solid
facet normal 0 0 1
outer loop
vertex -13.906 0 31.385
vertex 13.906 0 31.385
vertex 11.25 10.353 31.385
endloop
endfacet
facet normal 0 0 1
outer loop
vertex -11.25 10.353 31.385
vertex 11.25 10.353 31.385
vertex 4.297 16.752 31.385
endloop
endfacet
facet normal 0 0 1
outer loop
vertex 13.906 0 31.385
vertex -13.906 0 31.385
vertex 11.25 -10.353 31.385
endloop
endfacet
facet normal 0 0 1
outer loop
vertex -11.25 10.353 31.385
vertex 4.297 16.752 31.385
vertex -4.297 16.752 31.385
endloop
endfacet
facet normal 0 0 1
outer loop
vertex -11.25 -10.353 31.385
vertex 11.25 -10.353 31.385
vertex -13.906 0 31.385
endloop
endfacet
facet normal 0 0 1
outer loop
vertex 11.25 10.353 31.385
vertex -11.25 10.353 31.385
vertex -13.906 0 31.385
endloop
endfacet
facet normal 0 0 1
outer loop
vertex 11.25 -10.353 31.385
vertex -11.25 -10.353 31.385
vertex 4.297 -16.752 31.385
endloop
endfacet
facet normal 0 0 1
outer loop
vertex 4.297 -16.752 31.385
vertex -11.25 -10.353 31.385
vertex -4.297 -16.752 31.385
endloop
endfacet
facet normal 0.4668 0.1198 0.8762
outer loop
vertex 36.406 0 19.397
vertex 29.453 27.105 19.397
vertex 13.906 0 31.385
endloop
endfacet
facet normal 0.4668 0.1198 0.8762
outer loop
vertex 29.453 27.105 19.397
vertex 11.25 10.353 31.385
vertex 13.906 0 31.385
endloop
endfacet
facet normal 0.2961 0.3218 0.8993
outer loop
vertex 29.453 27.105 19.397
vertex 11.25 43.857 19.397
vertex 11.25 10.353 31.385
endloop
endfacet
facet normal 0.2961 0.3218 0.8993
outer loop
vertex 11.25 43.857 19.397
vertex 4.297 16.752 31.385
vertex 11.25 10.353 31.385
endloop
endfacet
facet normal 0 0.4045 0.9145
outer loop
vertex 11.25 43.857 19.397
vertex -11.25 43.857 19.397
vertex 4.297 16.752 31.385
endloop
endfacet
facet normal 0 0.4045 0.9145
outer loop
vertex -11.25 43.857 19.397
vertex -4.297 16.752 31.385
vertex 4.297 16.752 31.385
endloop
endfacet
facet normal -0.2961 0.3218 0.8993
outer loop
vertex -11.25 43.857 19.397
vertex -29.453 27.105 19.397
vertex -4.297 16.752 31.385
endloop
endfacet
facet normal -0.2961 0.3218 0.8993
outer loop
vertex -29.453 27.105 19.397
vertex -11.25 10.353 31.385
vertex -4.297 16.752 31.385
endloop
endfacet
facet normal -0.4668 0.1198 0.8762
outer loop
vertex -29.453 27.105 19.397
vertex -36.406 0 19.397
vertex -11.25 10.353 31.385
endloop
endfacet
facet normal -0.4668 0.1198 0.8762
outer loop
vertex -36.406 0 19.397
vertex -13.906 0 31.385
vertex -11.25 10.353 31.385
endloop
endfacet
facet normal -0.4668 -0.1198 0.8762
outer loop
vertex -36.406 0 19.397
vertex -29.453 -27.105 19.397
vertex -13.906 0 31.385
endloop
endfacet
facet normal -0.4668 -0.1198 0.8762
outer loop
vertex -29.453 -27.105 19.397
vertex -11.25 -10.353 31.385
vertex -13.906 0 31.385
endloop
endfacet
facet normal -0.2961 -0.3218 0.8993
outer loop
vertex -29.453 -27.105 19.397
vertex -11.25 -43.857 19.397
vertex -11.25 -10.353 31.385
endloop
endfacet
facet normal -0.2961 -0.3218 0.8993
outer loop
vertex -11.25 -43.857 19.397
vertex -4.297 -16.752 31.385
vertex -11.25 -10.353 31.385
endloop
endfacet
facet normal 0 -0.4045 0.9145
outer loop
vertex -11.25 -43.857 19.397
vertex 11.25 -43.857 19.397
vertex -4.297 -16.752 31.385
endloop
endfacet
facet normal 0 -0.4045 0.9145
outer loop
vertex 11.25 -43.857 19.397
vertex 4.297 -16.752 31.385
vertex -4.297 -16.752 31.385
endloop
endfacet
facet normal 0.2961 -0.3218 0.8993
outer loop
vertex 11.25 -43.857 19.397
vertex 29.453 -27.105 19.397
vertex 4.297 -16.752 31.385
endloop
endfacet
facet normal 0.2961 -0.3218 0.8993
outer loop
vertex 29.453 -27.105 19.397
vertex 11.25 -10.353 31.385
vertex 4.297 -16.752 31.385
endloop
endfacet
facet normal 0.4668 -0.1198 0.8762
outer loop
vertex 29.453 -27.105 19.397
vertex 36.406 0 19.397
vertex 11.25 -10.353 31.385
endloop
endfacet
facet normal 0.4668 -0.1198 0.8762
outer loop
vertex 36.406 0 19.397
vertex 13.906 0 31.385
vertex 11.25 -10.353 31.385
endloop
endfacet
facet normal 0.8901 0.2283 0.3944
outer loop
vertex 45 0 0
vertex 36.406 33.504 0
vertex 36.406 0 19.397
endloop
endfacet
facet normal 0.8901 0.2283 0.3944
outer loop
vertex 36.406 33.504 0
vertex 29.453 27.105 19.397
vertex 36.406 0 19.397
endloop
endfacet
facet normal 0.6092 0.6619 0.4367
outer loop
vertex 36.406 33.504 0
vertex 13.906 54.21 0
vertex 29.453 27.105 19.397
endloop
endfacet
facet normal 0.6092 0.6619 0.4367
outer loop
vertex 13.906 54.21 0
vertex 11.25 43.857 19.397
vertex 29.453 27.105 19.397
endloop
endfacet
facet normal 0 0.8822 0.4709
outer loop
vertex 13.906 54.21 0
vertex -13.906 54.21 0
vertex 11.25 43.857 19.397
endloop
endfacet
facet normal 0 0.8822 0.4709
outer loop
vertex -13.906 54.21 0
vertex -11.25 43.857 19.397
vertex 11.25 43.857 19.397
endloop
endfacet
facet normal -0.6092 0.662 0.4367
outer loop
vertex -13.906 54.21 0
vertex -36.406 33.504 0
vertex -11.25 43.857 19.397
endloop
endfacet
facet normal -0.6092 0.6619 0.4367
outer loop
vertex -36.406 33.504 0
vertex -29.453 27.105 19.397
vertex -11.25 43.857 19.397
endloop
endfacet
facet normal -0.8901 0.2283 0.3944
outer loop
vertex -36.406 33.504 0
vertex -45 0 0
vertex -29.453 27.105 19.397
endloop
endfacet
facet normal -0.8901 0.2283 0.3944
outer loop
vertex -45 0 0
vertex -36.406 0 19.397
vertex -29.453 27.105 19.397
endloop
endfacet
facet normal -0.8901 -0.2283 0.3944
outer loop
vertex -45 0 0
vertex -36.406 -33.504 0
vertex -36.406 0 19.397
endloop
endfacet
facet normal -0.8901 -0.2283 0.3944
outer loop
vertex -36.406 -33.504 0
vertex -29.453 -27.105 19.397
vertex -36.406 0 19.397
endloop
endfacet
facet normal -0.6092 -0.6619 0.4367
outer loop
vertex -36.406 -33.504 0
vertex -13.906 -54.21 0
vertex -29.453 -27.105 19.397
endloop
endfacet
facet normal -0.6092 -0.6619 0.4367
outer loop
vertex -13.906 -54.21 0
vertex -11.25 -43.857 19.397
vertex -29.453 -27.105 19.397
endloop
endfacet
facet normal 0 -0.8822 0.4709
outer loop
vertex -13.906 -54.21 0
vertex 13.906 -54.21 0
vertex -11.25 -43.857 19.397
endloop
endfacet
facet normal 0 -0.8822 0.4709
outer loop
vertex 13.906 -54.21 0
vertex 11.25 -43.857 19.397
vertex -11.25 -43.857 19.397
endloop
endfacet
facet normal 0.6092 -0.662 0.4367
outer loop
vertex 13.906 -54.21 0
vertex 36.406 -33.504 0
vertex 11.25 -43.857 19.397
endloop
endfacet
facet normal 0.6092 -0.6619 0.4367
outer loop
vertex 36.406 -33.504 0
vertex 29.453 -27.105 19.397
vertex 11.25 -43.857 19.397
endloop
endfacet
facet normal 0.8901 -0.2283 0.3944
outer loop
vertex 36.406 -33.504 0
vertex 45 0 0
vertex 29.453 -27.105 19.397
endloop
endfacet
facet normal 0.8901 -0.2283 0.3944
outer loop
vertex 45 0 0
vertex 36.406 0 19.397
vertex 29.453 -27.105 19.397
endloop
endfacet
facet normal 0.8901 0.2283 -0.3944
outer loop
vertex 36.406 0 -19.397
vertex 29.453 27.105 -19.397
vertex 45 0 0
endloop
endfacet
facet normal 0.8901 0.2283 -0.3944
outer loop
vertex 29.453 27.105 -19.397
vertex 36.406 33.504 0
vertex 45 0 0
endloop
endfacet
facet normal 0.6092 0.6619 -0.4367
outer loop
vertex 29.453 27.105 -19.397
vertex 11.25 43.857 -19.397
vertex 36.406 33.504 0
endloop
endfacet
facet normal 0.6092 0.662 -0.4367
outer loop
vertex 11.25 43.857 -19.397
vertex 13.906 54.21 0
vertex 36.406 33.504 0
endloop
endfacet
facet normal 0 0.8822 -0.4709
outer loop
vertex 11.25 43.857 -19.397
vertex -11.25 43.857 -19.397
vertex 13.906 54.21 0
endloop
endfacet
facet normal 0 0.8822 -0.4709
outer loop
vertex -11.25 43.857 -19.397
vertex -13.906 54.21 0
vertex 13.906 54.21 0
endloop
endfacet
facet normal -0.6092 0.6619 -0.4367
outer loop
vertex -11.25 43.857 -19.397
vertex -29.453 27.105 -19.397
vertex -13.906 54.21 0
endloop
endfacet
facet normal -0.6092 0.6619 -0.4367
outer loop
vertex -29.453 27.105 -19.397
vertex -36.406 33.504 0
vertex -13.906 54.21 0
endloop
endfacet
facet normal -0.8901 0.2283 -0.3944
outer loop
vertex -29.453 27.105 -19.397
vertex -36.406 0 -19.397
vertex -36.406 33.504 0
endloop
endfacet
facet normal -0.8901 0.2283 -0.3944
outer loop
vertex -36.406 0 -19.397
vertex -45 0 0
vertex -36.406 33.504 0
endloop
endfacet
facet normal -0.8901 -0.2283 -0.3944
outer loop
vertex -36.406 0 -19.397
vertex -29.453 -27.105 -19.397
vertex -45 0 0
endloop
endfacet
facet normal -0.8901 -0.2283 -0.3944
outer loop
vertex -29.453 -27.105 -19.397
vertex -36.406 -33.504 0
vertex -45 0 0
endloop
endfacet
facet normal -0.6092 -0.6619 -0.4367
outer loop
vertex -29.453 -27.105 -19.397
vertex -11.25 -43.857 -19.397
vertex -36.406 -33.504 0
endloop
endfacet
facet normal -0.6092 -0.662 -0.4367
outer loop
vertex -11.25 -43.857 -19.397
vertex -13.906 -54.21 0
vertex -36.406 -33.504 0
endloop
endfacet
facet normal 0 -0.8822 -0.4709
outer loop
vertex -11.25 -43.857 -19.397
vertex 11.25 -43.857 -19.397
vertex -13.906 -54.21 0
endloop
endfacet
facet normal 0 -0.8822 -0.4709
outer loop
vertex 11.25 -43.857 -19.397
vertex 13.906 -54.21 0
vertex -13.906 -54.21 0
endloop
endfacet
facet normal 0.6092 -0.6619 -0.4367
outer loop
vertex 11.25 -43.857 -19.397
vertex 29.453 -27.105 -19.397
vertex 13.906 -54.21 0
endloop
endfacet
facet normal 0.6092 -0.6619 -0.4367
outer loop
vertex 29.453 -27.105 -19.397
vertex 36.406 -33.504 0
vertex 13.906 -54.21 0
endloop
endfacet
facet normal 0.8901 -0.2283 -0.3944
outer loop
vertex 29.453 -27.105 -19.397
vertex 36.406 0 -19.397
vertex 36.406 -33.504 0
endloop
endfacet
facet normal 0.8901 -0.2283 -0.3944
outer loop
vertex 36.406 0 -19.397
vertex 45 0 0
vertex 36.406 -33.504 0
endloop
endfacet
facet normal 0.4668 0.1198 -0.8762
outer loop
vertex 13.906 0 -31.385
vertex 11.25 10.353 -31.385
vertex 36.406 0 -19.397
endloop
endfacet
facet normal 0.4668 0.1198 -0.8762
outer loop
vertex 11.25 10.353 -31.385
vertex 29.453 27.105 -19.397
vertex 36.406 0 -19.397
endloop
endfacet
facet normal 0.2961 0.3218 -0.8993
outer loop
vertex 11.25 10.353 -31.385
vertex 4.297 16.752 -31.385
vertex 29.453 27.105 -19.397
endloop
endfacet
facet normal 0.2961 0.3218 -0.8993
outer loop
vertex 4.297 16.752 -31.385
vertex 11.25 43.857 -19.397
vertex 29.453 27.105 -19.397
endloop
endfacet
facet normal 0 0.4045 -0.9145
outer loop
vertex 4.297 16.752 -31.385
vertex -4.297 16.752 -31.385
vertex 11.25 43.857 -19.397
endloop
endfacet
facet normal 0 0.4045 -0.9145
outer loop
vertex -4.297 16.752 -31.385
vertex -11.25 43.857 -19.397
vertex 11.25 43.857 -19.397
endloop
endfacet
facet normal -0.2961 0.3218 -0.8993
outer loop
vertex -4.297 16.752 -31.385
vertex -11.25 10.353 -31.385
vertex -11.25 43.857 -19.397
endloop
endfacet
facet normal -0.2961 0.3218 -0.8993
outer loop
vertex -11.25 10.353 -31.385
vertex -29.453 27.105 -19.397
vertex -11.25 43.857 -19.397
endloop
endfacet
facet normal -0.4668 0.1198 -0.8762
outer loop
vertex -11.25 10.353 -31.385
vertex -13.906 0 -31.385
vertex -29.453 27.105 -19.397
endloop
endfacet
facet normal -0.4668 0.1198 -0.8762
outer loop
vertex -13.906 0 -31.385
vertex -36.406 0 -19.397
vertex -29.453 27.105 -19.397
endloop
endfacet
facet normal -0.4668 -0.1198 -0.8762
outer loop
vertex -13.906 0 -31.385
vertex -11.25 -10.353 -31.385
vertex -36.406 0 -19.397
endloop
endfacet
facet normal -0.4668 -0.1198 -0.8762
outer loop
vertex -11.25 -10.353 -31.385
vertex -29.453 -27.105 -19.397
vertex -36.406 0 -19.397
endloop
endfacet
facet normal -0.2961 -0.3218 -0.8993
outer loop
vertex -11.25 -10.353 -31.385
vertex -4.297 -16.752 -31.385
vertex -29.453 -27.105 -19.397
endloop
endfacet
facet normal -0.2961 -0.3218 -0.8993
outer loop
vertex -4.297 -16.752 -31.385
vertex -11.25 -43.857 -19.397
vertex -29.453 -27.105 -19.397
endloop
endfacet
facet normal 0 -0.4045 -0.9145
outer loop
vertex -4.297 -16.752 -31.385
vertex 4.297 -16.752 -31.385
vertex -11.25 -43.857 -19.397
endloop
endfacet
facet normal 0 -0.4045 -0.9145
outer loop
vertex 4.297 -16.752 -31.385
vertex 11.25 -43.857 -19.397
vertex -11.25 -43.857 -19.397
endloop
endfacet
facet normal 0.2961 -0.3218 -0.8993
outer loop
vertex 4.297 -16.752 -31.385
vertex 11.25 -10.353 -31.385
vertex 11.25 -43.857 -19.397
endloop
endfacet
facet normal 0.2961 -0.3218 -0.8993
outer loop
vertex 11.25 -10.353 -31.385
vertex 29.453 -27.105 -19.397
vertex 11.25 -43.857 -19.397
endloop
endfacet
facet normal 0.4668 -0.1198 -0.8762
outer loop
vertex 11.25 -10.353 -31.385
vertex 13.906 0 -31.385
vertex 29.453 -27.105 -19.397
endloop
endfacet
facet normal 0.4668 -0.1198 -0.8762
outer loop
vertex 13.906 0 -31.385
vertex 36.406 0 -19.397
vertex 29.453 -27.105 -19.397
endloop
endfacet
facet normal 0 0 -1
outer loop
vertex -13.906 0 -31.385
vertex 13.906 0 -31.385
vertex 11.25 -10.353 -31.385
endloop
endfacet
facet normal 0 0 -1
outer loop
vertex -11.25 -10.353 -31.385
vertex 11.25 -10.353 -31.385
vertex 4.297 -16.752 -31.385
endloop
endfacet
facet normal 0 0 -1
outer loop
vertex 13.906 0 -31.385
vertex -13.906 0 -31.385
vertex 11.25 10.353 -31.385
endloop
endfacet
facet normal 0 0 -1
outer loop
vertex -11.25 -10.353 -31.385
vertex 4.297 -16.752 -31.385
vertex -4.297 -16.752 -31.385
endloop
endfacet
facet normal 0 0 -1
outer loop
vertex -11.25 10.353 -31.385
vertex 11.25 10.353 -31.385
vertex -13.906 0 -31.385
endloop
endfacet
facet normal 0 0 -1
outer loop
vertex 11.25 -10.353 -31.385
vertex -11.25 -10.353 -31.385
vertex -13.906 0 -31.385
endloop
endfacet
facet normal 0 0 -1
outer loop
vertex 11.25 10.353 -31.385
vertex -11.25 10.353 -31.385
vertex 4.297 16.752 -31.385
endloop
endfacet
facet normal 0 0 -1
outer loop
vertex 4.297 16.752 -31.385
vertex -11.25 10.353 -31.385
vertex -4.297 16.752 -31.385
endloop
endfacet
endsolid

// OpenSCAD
// Generated by SolidPython 1.0.1 on 2020-07-29 00:46:52


scale(v = [15, 19, 11]) {
	sphere(r = 3);
}
/***********************************************
*********      SolidPython code:      **********
************************************************
 
# import packages: SolidPython
from solid import *
from solid.utils import *
from itertools import chain, combinations, permutations


class Resize:

    def __init__(self, scad_file):
        self.scad_file = scad_file
        #self.scad_file = import_scad(scad_file)
        # cone/cylinder param:
        self.r1 = 0
        self.r2 = 0
        self.h = 0
        # rectangular prism param:
        self.w = 0
        self.l = 0
        # ellipse param:
        self.r = 0

    # import OpenScad code (file name corresponds to shape)


    # classify shape + parameters
    def assign(self, param1, param2, param3):
        if self.scad_file == 'cone.scad':
            self.r1 = param1
            self.r2 = param2
            self.h = param3
        elif self.scad_file == 'cylinder.scad':
            self.r1 = param1
            self.r2 = param2
            self.h = param3
        elif self.scad_file == 'rectangularPrism.scad':
            self.h = param1
            self.l = param2
            self.w = param3
        else:
            self.r = param1
            self.h = param2

    # resize parameters
    def iterate(self):
        x = range(3, 20, 2)
        i = 1
        if self.scad_file == 'cone.scad':
            tempList = list(permutations(x, 2))
            for temp in tempList:
                param1 = temp[0]
                param2 = temp[1]
                filepath = 'produced_scad_files/' + 'cone' + str(param1) + '_' + str(param2) + '_' + '.scad'
                scad_render_to_file(cylinder(h=param1, r1=param2, r2=0), filepath)

        elif self.scad_file == 'cylinder.scad':
            tempList = list(permutations(x, 3))
            for temp in tempList:
                param1 = temp[0]
                param2 = temp[1]
                filepath = 'produced_scad_files/' + 'cylinder' + str(param1) + '_' + str(param2) + '_' + '.scad'
                scad_render_to_file(cylinder(h=param1, r1=param2, r2=param2), filepath)

        elif self.scad_file == 'rectangularPrism.scad':
            tempList = list(permutations(x, 3))
            for temp in tempList:
                param1 = temp[0]
                param2 = temp[1]
                param3 = temp[2]
                filepath = 'produced_scad_files/' + 'rectangularPrism' + str(param1) + '_' + str(param2) + '_' + str(
                    param3) + '.scad'
                scad_render_to_file(cube(size=(param1, param2, param3)), filepath)

        elif self.scad_file == 'ellipse.scad':
            tempList = list(permutations(x, 4))
            for temp in tempList:
                param1 = temp[0]
                param2 = temp[1]
                param3 = temp[2]
                param4 = temp[3]
                filepath = 'produced_scad_files/' + 'ellipse' + str(param1) + '_' + str(param2) + '_' + str(param3) + '_' + str(param4) + '.scad'
                scad_render_to_file(scale([param1, param2, param3])(sphere(r=param4)), filepath)

    def render_to_scadfile(self):
        scad_render_to_file(scad, 'example.scad') 
 
************************************************/
